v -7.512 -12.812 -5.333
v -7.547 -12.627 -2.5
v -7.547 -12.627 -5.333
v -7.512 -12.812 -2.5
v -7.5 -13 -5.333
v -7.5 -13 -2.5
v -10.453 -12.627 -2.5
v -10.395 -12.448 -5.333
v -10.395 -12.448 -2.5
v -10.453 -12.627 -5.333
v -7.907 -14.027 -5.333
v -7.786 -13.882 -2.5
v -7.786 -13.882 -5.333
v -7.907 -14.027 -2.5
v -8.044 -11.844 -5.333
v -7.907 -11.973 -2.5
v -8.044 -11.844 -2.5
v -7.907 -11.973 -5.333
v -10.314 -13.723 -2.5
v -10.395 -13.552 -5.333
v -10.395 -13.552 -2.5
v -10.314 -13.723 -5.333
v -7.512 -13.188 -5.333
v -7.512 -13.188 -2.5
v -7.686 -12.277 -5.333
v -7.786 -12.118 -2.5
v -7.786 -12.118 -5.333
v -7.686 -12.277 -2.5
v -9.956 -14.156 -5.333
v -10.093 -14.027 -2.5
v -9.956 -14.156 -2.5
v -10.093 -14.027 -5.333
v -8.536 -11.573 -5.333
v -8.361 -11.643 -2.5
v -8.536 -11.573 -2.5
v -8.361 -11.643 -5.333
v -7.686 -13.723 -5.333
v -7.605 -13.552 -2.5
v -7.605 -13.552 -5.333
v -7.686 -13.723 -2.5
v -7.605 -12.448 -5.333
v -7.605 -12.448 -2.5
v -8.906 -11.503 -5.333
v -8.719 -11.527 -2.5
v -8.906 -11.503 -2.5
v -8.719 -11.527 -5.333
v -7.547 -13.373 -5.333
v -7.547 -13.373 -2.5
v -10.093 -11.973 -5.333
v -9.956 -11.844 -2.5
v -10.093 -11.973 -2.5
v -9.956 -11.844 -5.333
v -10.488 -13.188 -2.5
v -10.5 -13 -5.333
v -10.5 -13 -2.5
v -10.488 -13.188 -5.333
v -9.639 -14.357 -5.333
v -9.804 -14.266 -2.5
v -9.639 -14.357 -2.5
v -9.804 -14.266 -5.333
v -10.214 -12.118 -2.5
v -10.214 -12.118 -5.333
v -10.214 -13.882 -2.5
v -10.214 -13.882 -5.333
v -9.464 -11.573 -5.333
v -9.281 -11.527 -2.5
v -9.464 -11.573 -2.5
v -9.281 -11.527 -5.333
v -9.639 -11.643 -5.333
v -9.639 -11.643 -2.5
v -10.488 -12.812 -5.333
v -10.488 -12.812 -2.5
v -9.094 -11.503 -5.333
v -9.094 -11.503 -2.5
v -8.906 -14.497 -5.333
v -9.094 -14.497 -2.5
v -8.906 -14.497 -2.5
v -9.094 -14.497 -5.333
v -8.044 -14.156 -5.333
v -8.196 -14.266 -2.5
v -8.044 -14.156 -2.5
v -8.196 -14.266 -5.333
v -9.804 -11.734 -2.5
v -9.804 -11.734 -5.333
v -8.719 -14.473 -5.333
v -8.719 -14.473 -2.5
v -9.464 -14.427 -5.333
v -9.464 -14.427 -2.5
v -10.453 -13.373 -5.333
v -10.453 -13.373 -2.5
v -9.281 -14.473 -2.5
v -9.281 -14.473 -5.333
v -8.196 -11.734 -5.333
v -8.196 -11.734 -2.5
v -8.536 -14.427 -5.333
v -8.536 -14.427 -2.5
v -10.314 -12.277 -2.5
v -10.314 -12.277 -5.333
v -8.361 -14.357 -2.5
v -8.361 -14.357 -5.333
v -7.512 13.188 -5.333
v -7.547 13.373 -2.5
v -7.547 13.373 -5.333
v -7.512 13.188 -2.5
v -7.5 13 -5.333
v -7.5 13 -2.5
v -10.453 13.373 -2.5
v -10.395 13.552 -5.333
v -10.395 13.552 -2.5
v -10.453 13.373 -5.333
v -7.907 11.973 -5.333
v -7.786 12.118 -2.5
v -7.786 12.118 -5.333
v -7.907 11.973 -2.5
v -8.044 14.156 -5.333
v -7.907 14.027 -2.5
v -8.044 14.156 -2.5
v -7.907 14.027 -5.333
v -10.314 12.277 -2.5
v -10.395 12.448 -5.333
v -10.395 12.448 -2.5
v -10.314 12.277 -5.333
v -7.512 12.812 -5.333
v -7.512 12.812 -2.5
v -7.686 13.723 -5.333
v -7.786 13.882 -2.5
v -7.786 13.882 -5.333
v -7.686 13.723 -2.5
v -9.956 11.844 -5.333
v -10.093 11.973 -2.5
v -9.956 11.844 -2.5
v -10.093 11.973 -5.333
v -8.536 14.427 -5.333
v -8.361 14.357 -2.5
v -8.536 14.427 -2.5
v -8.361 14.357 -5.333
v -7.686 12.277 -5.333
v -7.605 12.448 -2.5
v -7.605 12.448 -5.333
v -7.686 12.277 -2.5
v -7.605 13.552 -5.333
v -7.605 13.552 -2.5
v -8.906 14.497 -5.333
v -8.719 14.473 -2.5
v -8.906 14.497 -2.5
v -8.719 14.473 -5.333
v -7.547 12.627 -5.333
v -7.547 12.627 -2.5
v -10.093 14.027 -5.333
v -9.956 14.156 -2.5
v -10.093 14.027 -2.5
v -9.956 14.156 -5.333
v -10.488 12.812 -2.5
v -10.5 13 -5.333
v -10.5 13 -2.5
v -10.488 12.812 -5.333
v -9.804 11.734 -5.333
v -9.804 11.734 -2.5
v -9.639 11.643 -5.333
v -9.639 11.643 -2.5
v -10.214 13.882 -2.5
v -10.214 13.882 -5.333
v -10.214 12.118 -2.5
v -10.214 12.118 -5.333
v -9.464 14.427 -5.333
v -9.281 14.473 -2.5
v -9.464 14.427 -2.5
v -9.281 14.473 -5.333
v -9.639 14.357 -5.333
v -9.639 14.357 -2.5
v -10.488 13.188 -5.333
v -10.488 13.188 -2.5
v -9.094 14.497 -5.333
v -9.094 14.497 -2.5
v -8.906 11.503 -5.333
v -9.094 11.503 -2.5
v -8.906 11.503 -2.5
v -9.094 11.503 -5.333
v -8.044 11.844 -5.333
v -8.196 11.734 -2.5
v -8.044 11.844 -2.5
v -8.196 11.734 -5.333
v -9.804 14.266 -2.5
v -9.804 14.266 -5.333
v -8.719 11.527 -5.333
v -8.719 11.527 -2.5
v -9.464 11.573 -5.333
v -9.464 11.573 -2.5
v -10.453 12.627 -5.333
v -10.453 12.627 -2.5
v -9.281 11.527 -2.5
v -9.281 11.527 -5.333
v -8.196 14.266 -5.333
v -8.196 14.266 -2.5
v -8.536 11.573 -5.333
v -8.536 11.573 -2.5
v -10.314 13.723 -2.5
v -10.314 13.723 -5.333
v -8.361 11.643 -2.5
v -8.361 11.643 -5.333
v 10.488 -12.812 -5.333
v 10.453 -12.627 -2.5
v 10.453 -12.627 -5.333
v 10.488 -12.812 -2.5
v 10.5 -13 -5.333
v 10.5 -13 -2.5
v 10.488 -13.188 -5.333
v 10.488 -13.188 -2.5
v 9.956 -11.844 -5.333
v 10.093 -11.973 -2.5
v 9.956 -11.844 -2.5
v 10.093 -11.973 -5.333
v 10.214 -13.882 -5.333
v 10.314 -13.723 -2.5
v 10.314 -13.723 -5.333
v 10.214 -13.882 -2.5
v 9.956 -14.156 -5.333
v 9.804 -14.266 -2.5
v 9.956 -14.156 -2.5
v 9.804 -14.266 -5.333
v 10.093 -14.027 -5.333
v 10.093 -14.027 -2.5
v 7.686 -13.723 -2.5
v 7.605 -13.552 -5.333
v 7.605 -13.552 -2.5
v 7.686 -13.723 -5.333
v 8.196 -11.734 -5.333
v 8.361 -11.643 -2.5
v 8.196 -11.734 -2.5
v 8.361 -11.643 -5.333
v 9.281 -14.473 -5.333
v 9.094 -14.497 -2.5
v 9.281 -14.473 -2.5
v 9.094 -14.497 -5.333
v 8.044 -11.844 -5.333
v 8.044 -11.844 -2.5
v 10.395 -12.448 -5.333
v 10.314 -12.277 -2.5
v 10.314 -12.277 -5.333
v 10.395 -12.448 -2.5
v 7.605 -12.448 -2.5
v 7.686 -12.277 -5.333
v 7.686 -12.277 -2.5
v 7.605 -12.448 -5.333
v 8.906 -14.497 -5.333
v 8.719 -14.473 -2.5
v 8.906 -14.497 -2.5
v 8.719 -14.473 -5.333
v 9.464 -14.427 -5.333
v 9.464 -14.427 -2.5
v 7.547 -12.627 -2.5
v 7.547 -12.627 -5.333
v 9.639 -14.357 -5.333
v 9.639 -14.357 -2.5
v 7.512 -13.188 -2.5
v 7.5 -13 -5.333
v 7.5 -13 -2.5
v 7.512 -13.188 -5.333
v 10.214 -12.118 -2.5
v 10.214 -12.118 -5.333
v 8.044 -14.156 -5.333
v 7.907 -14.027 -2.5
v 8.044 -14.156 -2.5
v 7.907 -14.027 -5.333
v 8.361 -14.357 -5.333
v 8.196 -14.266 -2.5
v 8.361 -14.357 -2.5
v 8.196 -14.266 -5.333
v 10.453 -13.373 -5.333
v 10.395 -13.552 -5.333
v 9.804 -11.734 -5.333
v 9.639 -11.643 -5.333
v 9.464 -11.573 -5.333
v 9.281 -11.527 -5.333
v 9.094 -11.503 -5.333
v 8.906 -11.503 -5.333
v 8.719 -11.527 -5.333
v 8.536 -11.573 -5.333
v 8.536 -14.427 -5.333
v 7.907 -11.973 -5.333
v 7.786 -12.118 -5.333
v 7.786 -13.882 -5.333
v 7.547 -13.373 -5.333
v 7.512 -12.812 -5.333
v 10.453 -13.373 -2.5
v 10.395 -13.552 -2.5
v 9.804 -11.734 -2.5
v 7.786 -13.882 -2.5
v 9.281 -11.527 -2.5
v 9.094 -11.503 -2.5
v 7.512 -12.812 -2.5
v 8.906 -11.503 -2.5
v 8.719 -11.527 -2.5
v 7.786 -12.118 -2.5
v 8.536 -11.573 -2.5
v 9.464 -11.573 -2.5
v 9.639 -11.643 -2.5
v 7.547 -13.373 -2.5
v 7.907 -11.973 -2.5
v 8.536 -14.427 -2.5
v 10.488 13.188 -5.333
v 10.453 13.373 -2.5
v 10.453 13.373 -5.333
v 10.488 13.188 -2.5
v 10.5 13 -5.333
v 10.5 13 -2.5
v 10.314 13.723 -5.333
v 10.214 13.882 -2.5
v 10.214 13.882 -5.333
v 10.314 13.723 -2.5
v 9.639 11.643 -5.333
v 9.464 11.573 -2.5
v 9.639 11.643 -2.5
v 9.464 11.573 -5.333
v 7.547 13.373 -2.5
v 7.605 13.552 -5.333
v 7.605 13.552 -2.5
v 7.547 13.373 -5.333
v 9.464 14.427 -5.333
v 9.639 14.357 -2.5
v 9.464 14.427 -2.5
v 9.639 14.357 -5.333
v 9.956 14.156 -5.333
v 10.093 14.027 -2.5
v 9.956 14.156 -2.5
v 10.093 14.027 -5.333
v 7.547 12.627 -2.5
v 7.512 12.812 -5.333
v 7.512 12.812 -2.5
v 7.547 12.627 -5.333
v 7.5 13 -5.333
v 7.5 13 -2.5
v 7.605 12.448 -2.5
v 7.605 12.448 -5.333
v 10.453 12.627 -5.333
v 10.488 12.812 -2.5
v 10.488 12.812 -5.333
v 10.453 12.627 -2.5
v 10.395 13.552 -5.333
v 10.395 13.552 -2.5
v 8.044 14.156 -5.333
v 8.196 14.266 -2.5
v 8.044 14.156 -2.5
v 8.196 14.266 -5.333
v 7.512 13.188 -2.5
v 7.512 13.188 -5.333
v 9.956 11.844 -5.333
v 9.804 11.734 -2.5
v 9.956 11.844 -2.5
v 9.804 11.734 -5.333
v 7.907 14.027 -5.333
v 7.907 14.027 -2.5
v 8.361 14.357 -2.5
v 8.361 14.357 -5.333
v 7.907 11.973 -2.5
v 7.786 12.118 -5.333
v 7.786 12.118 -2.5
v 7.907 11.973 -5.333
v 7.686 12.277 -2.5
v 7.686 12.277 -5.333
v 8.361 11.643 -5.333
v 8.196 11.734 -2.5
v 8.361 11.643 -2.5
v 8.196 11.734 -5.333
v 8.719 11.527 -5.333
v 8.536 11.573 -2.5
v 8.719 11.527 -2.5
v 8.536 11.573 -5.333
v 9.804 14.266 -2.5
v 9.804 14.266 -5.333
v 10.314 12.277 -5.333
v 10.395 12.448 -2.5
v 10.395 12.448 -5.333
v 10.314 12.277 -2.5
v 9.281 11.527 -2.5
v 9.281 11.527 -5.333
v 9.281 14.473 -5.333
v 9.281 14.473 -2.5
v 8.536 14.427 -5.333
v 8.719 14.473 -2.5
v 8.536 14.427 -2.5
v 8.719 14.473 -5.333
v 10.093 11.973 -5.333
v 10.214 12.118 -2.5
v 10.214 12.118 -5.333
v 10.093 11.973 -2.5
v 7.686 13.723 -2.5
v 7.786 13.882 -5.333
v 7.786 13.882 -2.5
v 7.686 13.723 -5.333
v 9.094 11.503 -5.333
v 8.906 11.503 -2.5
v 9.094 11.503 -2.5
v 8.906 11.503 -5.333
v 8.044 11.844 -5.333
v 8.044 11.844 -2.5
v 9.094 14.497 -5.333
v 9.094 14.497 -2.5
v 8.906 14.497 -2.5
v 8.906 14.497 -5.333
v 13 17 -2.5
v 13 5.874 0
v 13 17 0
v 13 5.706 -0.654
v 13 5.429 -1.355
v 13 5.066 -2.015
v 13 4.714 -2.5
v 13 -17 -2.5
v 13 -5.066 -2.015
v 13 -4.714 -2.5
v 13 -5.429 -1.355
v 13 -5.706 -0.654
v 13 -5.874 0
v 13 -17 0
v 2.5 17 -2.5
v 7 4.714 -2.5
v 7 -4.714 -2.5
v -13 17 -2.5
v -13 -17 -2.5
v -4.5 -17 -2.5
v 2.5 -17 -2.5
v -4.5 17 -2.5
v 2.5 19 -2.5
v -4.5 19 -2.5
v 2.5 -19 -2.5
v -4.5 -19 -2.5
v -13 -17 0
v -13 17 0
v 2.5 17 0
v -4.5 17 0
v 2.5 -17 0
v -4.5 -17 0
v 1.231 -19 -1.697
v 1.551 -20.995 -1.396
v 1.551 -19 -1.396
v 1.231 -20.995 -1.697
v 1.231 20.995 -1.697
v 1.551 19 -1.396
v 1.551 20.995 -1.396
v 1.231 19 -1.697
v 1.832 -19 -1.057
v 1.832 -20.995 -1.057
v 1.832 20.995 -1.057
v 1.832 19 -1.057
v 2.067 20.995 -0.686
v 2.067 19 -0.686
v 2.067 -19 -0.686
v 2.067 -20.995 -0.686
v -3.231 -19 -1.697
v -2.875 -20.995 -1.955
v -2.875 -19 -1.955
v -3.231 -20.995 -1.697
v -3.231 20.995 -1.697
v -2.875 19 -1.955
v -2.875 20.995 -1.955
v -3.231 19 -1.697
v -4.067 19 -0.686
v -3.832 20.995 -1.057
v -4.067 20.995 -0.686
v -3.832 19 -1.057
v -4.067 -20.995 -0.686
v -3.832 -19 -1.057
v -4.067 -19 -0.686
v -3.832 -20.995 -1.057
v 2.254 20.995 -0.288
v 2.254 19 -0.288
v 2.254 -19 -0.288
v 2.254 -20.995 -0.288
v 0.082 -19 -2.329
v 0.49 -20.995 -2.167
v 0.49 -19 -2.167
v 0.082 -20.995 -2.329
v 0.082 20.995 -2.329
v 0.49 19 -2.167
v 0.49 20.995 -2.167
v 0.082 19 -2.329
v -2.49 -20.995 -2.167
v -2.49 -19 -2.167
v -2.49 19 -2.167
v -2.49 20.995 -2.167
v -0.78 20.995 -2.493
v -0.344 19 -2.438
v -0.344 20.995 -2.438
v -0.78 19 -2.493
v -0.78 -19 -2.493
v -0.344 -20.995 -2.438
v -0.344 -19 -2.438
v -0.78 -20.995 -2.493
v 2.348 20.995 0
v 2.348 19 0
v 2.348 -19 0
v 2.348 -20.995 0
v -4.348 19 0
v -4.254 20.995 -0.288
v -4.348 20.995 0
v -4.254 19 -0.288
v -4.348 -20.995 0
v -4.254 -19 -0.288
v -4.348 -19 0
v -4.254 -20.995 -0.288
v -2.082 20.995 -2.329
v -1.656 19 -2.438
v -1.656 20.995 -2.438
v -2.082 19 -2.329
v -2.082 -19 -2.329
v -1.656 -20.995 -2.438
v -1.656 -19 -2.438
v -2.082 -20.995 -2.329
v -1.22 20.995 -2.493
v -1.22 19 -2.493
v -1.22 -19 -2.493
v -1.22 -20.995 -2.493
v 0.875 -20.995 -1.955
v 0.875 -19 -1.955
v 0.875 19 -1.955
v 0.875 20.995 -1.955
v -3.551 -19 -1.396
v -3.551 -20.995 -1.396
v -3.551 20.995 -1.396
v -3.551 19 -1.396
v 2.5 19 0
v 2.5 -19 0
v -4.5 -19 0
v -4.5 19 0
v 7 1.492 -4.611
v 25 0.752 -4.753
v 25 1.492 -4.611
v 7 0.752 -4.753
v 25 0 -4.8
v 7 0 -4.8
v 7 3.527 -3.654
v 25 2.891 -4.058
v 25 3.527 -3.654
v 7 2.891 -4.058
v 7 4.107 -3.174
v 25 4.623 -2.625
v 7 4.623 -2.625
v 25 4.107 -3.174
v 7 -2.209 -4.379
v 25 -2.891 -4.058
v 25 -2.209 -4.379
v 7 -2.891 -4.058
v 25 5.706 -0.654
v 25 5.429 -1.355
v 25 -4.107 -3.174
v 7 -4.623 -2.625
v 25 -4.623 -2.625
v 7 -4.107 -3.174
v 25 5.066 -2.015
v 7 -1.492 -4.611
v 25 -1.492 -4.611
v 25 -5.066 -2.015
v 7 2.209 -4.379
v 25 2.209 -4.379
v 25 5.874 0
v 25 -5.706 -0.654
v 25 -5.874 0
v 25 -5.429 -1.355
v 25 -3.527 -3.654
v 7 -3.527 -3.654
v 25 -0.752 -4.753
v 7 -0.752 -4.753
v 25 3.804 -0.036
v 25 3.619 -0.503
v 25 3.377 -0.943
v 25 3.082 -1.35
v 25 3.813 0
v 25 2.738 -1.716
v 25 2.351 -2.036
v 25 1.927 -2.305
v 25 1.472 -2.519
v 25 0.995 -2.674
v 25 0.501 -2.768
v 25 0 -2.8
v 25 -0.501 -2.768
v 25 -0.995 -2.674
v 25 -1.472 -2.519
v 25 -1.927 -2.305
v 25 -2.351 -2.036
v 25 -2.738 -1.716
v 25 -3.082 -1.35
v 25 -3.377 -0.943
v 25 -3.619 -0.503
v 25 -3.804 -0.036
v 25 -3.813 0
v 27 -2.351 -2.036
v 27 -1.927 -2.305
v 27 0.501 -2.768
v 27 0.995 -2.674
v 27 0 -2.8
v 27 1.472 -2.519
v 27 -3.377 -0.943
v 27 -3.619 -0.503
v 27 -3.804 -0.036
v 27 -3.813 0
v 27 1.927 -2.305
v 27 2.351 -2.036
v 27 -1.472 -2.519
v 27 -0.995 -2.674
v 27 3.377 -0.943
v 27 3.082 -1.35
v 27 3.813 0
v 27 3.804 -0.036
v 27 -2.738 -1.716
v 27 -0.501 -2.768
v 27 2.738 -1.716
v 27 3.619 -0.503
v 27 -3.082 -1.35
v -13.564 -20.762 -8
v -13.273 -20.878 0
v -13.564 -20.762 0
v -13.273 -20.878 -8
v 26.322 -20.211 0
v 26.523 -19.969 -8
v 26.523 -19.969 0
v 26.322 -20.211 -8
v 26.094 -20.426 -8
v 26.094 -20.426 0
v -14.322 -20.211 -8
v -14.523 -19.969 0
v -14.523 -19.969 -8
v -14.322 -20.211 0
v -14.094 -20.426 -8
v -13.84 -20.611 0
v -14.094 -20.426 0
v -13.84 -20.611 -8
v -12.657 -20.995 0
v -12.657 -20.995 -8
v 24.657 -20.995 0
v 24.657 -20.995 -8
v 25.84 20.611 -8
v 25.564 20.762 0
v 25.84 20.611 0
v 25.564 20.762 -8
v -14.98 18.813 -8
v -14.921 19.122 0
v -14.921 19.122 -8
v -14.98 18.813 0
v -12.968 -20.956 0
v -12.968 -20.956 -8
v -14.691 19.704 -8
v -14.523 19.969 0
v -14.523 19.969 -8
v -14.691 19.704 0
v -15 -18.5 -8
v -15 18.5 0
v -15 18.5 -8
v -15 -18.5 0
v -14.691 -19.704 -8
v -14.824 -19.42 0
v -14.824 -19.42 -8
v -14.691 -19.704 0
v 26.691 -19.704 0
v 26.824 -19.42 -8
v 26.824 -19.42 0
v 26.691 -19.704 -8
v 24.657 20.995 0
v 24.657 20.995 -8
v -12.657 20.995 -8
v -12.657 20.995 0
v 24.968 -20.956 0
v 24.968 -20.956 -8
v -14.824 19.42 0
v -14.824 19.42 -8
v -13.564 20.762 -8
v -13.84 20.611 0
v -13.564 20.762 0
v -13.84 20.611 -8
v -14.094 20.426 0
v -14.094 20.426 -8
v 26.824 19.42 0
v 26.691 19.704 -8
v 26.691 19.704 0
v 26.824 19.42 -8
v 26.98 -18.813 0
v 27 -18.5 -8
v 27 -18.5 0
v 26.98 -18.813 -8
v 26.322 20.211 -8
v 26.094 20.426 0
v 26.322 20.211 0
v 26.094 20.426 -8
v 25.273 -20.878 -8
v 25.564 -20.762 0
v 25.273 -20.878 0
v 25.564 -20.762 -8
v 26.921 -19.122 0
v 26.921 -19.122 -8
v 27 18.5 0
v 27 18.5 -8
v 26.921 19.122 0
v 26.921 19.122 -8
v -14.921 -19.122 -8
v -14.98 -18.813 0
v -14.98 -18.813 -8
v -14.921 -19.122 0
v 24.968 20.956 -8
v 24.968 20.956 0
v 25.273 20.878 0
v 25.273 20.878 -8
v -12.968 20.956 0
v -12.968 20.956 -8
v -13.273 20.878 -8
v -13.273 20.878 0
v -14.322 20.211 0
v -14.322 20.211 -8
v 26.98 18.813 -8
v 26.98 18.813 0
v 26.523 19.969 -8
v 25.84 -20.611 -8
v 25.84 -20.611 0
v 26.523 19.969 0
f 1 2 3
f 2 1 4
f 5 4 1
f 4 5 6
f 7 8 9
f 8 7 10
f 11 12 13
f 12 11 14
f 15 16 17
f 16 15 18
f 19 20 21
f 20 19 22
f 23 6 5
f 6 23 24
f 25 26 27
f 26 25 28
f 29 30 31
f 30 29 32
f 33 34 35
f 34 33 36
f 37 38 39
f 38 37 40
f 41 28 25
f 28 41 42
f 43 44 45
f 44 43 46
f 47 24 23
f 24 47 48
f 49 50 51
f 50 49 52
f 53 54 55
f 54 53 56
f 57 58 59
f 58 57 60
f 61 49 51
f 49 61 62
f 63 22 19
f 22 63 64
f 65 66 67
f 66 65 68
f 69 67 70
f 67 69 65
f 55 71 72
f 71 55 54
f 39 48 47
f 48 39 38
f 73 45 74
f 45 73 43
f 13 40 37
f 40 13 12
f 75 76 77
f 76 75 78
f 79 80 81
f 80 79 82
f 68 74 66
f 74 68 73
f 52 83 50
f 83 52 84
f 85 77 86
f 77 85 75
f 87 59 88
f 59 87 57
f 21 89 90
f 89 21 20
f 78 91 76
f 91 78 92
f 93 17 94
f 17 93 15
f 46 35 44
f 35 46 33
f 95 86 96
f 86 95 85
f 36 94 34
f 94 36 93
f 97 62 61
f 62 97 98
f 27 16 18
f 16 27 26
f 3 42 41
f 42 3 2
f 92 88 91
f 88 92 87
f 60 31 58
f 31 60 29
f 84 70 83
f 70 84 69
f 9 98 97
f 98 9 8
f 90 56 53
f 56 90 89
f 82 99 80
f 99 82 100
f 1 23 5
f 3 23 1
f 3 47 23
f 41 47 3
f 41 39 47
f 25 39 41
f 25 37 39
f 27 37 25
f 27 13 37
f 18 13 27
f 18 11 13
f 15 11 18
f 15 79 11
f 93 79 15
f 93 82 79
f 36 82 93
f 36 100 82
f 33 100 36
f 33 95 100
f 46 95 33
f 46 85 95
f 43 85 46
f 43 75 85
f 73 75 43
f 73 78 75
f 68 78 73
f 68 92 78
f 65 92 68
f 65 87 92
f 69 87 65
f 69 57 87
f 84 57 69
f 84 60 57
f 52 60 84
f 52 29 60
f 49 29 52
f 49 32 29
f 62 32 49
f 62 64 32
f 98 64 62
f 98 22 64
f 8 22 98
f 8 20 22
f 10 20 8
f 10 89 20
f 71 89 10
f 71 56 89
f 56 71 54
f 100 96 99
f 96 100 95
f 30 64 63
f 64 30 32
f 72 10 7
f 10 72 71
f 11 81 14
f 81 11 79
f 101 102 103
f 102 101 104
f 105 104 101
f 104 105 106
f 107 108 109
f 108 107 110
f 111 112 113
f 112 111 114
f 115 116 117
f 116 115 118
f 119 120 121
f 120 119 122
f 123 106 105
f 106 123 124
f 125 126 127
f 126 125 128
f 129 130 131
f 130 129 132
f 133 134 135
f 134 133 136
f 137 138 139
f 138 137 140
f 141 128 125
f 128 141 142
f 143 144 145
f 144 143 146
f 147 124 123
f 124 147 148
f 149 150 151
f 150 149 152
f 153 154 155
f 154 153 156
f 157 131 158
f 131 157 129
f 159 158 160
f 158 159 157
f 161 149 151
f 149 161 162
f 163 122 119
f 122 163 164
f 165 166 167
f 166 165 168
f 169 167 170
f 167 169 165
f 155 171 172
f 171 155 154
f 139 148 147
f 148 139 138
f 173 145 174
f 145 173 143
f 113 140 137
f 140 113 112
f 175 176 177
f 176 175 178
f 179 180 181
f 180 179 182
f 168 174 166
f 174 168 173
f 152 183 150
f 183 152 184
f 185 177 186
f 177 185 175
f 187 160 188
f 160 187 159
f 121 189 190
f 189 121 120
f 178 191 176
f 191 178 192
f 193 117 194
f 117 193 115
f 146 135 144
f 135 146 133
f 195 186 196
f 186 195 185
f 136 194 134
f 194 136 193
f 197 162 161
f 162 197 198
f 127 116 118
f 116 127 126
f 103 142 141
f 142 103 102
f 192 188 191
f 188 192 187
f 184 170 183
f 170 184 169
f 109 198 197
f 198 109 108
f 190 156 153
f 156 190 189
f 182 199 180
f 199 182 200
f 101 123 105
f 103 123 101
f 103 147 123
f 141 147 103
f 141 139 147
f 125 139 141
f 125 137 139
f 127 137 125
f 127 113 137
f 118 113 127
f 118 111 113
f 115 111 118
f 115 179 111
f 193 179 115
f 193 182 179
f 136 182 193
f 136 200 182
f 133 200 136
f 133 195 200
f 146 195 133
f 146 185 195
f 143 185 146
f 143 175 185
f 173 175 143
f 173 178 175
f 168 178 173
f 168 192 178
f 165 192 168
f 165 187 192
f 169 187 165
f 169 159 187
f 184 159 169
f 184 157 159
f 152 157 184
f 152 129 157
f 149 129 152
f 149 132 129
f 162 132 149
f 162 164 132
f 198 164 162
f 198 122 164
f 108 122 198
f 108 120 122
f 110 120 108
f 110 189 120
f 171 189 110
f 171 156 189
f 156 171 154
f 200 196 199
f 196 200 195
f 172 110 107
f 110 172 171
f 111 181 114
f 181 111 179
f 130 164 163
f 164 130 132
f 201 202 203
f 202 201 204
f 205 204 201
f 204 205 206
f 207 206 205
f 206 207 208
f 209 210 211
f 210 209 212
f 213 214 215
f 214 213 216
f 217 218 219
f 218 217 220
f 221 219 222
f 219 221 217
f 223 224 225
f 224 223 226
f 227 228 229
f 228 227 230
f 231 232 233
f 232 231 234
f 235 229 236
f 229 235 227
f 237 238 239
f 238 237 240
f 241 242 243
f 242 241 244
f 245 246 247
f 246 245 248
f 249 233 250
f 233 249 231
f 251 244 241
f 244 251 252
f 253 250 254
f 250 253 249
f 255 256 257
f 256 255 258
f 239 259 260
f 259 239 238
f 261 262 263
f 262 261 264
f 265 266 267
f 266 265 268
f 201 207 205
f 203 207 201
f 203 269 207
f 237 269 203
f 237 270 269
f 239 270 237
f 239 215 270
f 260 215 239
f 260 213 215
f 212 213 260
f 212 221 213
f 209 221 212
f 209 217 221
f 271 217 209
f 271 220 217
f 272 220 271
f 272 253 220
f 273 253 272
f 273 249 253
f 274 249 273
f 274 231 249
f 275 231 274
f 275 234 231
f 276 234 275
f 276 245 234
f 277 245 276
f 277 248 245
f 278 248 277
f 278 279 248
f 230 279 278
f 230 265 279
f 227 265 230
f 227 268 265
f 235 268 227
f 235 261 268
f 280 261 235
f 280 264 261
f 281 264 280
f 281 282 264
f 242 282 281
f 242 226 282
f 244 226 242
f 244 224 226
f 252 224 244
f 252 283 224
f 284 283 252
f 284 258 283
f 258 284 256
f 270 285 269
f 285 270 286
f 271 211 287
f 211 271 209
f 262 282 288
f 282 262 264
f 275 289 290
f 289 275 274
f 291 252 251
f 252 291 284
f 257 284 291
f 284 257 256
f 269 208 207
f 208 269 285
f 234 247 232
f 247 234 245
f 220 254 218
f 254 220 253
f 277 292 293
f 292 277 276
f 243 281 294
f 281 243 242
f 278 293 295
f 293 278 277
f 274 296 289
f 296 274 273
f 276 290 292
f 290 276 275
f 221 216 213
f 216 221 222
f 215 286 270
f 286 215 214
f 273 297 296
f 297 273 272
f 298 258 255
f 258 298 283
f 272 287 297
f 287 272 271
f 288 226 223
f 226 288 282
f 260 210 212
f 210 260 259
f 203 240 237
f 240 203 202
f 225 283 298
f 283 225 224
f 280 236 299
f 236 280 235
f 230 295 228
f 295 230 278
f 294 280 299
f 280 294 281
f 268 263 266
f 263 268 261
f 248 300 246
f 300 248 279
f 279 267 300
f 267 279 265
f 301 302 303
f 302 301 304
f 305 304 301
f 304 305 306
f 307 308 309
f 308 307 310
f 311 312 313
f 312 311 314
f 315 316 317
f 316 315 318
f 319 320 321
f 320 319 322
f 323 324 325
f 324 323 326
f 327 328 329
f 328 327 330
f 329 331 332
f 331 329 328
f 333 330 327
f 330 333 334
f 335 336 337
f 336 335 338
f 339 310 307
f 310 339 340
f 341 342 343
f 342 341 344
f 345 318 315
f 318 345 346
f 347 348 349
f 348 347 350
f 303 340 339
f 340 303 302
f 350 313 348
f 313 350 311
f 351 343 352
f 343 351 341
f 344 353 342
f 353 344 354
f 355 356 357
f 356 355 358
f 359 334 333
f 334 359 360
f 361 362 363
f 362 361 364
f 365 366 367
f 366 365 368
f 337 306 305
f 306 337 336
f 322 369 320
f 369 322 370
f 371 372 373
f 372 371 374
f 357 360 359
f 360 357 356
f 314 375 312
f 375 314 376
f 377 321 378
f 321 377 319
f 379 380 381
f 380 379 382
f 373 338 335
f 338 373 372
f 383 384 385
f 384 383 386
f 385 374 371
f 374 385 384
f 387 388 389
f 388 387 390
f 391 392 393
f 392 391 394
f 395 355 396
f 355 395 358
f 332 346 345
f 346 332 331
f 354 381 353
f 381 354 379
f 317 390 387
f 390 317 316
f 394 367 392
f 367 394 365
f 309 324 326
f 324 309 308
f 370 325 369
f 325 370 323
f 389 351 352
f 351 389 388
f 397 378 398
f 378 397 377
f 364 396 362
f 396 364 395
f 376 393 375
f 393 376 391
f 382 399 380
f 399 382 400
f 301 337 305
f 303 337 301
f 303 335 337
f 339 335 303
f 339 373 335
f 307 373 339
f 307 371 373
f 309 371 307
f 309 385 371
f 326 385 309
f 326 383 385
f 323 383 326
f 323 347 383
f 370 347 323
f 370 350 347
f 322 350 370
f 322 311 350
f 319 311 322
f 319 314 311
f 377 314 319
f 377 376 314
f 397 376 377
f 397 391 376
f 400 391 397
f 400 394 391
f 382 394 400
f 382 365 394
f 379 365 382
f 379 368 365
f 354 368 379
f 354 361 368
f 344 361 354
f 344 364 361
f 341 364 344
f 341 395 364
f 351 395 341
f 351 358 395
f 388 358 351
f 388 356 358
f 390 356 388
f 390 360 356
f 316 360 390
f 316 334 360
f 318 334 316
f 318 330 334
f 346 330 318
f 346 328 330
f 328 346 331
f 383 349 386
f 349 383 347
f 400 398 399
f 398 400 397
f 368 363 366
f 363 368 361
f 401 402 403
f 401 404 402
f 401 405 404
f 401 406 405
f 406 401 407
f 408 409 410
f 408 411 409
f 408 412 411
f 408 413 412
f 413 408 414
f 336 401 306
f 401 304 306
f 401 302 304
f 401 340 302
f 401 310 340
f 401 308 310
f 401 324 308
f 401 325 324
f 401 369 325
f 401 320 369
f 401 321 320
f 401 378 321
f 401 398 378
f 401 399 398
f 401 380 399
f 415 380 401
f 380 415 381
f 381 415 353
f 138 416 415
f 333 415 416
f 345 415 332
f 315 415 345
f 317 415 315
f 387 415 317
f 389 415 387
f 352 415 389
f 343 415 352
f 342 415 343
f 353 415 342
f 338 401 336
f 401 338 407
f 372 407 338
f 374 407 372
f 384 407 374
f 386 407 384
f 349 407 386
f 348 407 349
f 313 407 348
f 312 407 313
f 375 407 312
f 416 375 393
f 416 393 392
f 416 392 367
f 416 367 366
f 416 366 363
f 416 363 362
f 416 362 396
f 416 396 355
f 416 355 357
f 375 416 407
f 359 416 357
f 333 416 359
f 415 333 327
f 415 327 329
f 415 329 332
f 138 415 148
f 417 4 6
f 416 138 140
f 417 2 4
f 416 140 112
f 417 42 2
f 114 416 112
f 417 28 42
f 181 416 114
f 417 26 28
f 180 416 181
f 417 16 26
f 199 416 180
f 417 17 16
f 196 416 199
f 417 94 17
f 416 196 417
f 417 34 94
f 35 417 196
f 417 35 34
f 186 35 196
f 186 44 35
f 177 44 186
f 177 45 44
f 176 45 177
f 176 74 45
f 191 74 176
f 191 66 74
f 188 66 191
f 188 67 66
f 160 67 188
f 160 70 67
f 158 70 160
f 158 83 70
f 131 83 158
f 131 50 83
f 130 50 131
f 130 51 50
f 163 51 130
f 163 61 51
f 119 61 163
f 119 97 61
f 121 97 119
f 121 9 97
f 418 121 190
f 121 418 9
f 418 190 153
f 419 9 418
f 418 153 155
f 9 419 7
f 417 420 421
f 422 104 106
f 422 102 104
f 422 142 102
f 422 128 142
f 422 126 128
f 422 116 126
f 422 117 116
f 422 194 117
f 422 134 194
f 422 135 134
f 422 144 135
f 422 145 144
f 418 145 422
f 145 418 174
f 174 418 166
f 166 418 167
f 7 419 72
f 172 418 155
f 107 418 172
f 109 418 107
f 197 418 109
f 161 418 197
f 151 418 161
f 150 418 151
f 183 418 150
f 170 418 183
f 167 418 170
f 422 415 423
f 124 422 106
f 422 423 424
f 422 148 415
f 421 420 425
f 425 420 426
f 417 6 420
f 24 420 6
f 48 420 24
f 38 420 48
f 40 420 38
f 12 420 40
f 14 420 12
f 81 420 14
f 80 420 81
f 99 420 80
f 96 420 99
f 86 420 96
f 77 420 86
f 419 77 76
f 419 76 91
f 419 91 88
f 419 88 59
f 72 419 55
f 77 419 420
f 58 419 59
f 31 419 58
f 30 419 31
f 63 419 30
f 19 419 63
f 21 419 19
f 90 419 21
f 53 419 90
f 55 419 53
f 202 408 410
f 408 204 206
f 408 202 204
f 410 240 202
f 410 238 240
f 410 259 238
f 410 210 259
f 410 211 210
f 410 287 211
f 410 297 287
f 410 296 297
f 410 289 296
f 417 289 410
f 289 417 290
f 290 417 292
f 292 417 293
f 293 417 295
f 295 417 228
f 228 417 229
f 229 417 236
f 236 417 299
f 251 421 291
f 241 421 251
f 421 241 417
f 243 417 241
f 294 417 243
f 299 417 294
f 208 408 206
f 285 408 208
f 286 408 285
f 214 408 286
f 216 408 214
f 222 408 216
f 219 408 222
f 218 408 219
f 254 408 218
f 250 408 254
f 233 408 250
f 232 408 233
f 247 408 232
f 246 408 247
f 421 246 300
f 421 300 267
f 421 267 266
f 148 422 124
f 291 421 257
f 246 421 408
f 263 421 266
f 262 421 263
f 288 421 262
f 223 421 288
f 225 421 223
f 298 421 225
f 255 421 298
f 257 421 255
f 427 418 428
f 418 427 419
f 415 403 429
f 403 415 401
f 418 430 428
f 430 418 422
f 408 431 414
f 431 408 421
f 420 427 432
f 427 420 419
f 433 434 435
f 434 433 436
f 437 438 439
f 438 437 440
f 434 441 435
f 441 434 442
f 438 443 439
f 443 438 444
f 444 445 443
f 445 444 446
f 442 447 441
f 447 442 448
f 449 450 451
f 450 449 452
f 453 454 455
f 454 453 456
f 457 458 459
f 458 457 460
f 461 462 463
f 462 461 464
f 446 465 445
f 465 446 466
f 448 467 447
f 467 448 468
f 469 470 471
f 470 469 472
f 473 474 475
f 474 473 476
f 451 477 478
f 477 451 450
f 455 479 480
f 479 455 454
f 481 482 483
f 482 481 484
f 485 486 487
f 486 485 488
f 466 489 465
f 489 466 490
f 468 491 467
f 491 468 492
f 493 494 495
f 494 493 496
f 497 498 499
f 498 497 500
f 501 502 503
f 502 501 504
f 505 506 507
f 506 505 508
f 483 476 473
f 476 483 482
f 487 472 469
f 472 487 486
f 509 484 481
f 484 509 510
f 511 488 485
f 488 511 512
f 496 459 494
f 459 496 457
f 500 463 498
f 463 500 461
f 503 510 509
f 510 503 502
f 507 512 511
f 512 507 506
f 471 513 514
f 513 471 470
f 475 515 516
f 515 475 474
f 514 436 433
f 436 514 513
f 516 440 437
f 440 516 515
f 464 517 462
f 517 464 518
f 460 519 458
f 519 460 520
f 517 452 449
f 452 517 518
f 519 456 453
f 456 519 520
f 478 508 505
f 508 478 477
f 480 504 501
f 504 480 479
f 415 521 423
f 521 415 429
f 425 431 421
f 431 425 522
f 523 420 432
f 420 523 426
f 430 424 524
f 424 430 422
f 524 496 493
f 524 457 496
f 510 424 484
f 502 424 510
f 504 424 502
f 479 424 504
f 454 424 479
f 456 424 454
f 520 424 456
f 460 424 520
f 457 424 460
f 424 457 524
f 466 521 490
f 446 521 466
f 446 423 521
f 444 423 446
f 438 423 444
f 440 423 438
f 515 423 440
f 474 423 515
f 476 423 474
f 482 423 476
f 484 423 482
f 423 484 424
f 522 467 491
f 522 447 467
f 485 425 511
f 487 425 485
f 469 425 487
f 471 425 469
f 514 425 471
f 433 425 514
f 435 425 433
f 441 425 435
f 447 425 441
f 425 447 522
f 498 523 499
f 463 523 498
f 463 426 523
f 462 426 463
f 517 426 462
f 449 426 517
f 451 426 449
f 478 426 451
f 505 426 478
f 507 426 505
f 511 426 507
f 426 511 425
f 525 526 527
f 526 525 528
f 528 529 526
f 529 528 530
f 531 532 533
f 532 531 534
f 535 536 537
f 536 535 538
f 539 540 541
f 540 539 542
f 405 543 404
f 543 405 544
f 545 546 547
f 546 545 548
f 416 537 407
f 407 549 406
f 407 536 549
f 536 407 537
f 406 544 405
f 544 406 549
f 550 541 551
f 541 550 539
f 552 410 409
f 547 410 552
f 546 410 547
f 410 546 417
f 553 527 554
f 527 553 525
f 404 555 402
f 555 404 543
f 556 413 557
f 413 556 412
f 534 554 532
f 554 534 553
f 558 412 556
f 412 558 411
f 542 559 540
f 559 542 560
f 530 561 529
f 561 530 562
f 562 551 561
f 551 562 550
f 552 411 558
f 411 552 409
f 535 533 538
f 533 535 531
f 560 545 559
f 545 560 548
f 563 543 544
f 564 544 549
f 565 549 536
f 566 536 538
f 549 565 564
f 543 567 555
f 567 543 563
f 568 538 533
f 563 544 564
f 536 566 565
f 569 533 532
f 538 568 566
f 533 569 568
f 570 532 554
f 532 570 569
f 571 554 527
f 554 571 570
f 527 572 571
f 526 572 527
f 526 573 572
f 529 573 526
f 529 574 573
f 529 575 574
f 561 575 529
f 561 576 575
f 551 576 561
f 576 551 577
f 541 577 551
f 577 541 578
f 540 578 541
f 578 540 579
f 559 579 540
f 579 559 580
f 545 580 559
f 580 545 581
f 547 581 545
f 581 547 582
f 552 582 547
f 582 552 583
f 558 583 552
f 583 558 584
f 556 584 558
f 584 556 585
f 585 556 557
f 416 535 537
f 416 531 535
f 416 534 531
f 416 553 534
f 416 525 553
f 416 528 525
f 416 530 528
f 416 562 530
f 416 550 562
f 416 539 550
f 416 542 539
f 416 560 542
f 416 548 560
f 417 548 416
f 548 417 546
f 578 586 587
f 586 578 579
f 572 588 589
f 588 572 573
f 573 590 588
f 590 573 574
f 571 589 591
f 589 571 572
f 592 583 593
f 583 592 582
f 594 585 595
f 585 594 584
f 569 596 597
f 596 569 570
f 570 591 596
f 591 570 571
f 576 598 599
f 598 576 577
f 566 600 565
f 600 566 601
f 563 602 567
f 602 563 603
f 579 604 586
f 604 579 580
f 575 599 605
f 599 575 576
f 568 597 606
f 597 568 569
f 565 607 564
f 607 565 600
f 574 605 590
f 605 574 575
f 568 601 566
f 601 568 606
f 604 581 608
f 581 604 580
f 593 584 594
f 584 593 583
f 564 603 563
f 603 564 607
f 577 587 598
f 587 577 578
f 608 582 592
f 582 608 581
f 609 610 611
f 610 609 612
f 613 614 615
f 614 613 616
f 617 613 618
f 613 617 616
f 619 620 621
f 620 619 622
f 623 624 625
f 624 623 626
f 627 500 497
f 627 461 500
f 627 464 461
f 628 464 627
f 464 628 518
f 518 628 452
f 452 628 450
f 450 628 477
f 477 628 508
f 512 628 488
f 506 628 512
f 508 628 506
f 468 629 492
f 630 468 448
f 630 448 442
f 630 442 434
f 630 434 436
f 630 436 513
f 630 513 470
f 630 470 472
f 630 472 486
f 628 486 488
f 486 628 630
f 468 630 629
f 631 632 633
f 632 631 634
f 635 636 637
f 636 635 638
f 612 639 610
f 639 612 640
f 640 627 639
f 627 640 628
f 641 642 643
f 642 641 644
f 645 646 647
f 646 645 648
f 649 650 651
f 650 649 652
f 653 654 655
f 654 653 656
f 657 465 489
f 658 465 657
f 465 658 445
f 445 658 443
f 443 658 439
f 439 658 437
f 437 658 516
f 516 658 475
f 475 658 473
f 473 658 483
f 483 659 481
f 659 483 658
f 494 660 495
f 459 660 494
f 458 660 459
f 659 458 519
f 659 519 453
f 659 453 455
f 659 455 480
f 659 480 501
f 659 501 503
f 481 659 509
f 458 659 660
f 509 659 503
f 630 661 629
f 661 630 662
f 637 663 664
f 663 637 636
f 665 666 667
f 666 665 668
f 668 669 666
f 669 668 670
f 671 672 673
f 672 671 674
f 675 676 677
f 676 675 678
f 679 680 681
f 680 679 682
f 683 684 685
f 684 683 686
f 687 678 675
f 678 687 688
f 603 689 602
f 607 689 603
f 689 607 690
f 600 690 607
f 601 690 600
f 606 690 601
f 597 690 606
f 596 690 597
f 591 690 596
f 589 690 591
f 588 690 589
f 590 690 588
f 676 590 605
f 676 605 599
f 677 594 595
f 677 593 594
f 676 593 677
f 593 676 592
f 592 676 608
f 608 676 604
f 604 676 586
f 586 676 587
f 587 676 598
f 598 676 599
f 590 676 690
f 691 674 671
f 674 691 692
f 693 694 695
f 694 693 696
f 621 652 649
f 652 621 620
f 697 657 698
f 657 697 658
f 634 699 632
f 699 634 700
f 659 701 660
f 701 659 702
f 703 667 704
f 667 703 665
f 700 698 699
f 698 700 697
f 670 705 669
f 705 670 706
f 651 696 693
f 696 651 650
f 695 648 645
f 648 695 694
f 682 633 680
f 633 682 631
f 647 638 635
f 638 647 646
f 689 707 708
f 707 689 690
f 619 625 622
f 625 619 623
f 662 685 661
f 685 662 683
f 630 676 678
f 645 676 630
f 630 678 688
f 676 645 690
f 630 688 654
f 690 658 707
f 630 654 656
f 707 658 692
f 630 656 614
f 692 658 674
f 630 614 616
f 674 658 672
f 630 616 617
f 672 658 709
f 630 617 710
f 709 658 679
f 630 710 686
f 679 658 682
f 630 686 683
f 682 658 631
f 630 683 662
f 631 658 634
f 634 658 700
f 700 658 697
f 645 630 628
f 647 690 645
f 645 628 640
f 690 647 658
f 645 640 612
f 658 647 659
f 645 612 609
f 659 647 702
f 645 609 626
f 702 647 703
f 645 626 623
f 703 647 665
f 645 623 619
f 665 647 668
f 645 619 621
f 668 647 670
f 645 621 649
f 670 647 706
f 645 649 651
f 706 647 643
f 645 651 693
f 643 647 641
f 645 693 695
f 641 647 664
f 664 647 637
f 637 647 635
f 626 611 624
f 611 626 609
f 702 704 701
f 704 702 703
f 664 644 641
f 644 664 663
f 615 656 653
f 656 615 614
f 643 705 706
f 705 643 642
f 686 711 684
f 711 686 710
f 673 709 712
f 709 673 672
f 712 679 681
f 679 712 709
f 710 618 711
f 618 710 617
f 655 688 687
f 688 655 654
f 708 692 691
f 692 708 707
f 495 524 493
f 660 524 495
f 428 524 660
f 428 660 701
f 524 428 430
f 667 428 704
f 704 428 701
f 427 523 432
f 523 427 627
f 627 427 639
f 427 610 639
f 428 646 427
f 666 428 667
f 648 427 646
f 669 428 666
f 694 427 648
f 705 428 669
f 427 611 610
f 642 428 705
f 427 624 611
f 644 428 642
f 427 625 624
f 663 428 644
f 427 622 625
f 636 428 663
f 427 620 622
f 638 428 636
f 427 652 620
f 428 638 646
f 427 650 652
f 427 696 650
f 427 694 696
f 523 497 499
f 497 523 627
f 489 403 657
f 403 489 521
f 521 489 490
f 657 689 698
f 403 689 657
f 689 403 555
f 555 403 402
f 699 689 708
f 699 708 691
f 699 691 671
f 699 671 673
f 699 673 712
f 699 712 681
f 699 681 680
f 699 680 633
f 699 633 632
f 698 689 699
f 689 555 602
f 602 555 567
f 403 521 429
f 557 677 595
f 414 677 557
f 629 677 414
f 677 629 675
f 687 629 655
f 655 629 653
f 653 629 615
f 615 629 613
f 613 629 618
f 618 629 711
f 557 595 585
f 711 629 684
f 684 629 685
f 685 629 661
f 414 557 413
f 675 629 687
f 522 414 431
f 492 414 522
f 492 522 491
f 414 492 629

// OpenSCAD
LNA_CONN_DIA = 7;
LNA_CONN_BASE = 2;
LNA_CONN_OFFSET_X = -1;
LNA_CONN_OFFSET_Y = 0;
LNA_CONN_OFFSET_Z = 1;
LNA_WIDTH = 26;
LNA_LENGTH = 34;
LNA_THICKNESS = 5;
LNA_HOLE_DIA = 3;
LNA_HOLE_SPACING_WIDTH = 18;
LNA_HOLE_SPACING_LENGTH = 26;

DC_DIA = 12;
DC_JACK_DIA = 8;
DC_LENGTH = 18;
DC_OFFSET_X = -6;
DC_OFFSET_Y = 0;
DC_OFFSET_Z = 1.2;

THICKNESS = 2;
LENGTH = LNA_LENGTH + 2 * LNA_CONN_BASE + 2 * THICKNESS;
WIDTH = LNA_WIDTH + (DC_LENGTH + DC_OFFSET_X) + 2 * THICKNESS;
HEIGHT = DC_DIA + 2 * THICKNESS;
CORNER_DIA = 5;

TOP = false;

$fn = 50;

module rounded_cube(width, length, height, corner_dia) {
    hull() {
        for(i = [-1, 1]) {
            for(j = [-1, 1]) {
                translate([i * (width-corner_dia)/2, j * (length - corner_dia)/2, 0])
                cylinder(d = corner_dia, h = height, center = true);
            }
        }
    }
}

module lna() {
    union() {
        cube(size = [LNA_WIDTH, LNA_LENGTH, LNA_THICKNESS], center = true);

        translate([LNA_CONN_OFFSET_X, LNA_CONN_OFFSET_Y, LNA_CONN_OFFSET_Z])
        rotate([90, 0, 0])
        cylinder(d = LNA_CONN_DIA, h = LNA_LENGTH + 20, center = true);

        translate([LNA_CONN_OFFSET_X, LNA_CONN_OFFSET_Y, LNA_CONN_OFFSET_Z])
        cube(size = [LNA_CONN_DIA, LNA_LENGTH + 2 * LNA_CONN_BASE, LNA_CONN_DIA], center = true);

        for (i = [-1, 1]) {
            for (j = [-1, 1]) {
                translate([i * LNA_HOLE_SPACING_WIDTH/2, j * LNA_HOLE_SPACING_LENGTH/2, -HEIGHT/3])
                cylinder(d = LNA_HOLE_DIA, h = HEIGHT * 2);
            }
        }
    }
}

module dc_jack() {
    translate([LNA_WIDTH/2 + DC_OFFSET_X, DC_OFFSET_Y, DC_OFFSET_Z])
    rotate([0, 90, 0])
    union() {
        cylinder(d = DC_DIA, h = DC_LENGTH);
        cylinder(d = DC_JACK_DIA, h = DC_LENGTH * 2);
    }
}

module case() {
    translate([WIDTH/2 - LNA_WIDTH/2 - THICKNESS, 0, 0])
    rounded_cube(WIDTH, LENGTH, HEIGHT, CORNER_DIA);
}

intersection() {
    difference() {
        case();
        lna();
        dc_jack();
    }

    translate([0, 0, TOP ? 0 : -HEIGHT])
    cylinder(d = 2 * WIDTH, h = HEIGHT);
}
